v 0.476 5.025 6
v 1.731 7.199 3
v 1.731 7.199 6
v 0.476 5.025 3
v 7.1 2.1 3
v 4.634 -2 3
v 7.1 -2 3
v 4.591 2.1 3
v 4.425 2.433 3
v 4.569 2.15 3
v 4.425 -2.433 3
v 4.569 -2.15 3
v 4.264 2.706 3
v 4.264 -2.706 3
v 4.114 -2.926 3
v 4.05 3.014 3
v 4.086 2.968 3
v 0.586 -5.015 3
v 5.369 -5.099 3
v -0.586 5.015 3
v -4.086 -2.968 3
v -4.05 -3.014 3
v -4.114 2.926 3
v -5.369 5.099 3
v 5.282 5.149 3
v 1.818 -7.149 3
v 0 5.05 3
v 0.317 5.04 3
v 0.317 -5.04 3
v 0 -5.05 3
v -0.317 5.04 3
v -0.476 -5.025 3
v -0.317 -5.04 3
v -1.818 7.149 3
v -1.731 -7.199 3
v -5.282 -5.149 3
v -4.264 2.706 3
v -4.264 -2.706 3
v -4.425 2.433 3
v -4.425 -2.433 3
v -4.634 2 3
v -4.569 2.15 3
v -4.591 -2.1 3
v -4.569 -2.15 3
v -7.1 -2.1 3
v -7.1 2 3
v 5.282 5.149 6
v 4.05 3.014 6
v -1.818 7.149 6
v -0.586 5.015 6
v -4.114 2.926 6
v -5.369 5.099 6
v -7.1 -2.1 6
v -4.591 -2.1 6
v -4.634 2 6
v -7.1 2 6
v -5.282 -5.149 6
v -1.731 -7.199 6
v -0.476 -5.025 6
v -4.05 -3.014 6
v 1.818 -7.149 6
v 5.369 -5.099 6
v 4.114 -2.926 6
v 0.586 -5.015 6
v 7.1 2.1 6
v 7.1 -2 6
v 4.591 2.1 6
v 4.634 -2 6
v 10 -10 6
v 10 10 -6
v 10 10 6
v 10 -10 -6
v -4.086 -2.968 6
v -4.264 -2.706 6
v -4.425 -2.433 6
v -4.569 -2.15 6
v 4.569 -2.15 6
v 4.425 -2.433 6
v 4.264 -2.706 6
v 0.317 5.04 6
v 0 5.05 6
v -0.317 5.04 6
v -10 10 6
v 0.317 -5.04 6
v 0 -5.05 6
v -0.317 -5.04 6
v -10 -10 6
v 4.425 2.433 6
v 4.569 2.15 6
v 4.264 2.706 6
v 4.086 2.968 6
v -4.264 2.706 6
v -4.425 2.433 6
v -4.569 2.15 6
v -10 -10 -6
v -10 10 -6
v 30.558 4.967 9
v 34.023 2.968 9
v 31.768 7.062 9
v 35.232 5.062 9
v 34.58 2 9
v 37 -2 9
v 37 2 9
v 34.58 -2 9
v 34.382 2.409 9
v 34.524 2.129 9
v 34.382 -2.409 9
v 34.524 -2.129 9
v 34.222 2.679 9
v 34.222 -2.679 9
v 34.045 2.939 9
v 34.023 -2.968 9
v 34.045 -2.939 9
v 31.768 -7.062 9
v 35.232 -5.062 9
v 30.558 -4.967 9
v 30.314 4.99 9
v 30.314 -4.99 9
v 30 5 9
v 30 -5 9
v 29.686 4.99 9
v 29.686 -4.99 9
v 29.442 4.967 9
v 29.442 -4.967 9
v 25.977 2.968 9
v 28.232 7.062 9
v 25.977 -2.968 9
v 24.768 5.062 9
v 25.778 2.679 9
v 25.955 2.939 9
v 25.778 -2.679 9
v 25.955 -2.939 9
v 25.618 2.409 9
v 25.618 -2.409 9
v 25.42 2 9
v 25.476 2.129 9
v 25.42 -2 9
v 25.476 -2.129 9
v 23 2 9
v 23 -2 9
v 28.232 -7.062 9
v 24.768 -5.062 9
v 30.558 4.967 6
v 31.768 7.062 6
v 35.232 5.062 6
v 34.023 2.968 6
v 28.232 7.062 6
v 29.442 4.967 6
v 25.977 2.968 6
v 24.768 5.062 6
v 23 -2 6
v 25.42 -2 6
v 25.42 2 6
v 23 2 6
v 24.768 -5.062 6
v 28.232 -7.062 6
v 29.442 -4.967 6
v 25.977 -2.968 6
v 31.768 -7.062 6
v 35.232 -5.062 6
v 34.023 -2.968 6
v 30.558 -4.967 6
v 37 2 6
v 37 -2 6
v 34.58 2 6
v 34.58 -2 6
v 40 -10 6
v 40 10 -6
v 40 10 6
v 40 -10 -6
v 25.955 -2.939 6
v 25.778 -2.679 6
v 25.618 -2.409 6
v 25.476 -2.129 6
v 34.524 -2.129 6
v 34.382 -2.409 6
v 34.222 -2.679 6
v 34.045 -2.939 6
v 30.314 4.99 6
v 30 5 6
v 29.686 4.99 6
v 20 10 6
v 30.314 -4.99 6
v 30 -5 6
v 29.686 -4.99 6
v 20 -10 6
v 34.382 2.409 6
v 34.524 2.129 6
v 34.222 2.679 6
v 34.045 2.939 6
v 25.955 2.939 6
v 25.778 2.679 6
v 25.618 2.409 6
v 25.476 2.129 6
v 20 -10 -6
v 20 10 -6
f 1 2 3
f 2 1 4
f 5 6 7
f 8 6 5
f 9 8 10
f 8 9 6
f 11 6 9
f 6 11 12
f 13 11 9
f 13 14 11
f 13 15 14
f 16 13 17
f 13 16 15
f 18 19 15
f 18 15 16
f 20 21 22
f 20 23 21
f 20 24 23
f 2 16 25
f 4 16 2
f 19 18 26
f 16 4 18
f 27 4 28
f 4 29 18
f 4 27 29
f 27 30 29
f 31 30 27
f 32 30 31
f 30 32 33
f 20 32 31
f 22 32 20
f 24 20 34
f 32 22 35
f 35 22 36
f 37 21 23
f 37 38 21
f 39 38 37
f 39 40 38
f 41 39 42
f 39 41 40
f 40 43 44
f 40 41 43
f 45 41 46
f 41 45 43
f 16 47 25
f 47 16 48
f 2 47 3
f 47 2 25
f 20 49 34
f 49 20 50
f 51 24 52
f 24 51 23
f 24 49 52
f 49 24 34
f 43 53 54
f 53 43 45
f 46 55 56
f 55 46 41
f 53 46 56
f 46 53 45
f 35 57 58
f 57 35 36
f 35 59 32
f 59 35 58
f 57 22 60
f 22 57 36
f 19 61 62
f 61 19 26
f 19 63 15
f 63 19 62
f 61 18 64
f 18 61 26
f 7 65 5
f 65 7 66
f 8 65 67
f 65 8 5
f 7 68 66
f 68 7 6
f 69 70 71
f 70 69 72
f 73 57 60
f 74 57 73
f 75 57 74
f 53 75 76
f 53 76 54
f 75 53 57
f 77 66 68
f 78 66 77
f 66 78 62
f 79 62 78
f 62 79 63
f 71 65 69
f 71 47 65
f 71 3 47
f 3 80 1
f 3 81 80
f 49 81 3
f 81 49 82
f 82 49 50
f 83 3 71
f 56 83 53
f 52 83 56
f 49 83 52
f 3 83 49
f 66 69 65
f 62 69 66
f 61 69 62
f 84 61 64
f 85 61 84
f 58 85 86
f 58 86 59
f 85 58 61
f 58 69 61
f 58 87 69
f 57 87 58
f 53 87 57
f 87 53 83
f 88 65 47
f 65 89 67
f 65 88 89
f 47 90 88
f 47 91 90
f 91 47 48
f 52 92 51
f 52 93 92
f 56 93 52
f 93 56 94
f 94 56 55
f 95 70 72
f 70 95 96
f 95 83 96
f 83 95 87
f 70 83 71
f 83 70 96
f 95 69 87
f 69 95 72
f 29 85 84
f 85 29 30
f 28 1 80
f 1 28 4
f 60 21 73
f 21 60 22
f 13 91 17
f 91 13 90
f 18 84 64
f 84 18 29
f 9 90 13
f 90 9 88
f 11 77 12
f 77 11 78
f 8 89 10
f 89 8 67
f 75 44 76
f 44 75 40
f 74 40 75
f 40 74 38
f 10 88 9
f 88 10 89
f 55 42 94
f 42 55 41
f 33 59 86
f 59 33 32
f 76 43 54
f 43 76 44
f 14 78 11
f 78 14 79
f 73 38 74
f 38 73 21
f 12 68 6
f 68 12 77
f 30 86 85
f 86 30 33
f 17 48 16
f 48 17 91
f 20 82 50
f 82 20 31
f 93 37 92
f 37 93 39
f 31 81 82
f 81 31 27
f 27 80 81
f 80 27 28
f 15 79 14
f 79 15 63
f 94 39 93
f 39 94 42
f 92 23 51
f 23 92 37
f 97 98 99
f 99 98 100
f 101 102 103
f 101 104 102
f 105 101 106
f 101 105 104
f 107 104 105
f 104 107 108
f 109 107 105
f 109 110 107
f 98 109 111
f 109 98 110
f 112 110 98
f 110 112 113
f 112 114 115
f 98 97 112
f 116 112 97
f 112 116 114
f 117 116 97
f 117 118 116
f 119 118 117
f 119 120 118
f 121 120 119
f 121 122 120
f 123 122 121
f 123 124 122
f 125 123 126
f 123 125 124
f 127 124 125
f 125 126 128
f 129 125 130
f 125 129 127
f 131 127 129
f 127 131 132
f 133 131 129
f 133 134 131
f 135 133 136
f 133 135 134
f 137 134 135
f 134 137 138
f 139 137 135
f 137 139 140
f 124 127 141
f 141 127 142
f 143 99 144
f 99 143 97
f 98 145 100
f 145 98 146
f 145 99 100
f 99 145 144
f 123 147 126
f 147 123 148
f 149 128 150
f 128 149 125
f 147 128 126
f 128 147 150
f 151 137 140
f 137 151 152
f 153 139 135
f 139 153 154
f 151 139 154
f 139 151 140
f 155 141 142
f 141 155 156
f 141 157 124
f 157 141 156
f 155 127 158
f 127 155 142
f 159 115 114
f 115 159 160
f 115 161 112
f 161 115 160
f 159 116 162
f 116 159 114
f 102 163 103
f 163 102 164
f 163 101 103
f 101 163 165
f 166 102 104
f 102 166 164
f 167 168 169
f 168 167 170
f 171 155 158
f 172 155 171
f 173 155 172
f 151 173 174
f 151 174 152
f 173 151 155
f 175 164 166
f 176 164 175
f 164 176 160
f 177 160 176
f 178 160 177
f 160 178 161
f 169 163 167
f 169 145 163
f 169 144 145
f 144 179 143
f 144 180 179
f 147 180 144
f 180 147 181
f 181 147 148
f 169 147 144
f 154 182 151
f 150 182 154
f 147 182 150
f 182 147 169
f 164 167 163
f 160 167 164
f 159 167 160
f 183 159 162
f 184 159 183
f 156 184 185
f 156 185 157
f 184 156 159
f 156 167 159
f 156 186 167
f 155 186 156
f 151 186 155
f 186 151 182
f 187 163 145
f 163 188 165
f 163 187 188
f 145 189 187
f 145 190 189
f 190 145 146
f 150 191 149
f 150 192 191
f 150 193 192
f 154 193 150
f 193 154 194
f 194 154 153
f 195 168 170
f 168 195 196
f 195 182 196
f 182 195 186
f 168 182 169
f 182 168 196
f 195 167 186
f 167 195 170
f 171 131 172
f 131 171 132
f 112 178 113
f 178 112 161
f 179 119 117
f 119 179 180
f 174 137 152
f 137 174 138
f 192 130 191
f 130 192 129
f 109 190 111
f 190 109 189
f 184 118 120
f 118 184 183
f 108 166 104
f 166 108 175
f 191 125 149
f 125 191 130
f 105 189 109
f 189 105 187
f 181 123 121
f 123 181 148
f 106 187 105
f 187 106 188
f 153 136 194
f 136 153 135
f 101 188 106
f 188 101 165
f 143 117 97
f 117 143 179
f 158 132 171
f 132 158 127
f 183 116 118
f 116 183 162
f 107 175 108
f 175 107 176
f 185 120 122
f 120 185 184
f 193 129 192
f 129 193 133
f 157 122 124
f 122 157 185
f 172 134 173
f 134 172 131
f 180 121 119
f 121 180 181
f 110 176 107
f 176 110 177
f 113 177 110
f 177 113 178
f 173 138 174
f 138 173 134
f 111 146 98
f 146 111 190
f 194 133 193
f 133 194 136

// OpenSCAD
$fn = 100;
error = 0.1;
x = 20;
y = 20; 
h = 6;
n = 6;


difference() {
    cube([x,y,h * 2], center = true);
    
    translate([0, 0 , h])
    cylinder(d = y/2 + error, h = h, center = true);
    
    for (i=[1:n]) {
        rotate([0, 0, i*360/n])
        translate([x/4-2, -2 , h/2])
        cube([4 + error, 4 + error, h]);
        }
}
   
color("cyan")
translate([30, 0,0])    
union() {
    cube([x,y,h * 2], center = true);
    
    translate([0, 0 , h])
    cylinder(d = y/2 , h = h, center = true);
    
    for (i=[1:n]) {
        rotate([0, 0, i*360/n])
        translate([x/4-2, -2 , h/ 2])
        cube([4, 4, h]);
        }    
}
